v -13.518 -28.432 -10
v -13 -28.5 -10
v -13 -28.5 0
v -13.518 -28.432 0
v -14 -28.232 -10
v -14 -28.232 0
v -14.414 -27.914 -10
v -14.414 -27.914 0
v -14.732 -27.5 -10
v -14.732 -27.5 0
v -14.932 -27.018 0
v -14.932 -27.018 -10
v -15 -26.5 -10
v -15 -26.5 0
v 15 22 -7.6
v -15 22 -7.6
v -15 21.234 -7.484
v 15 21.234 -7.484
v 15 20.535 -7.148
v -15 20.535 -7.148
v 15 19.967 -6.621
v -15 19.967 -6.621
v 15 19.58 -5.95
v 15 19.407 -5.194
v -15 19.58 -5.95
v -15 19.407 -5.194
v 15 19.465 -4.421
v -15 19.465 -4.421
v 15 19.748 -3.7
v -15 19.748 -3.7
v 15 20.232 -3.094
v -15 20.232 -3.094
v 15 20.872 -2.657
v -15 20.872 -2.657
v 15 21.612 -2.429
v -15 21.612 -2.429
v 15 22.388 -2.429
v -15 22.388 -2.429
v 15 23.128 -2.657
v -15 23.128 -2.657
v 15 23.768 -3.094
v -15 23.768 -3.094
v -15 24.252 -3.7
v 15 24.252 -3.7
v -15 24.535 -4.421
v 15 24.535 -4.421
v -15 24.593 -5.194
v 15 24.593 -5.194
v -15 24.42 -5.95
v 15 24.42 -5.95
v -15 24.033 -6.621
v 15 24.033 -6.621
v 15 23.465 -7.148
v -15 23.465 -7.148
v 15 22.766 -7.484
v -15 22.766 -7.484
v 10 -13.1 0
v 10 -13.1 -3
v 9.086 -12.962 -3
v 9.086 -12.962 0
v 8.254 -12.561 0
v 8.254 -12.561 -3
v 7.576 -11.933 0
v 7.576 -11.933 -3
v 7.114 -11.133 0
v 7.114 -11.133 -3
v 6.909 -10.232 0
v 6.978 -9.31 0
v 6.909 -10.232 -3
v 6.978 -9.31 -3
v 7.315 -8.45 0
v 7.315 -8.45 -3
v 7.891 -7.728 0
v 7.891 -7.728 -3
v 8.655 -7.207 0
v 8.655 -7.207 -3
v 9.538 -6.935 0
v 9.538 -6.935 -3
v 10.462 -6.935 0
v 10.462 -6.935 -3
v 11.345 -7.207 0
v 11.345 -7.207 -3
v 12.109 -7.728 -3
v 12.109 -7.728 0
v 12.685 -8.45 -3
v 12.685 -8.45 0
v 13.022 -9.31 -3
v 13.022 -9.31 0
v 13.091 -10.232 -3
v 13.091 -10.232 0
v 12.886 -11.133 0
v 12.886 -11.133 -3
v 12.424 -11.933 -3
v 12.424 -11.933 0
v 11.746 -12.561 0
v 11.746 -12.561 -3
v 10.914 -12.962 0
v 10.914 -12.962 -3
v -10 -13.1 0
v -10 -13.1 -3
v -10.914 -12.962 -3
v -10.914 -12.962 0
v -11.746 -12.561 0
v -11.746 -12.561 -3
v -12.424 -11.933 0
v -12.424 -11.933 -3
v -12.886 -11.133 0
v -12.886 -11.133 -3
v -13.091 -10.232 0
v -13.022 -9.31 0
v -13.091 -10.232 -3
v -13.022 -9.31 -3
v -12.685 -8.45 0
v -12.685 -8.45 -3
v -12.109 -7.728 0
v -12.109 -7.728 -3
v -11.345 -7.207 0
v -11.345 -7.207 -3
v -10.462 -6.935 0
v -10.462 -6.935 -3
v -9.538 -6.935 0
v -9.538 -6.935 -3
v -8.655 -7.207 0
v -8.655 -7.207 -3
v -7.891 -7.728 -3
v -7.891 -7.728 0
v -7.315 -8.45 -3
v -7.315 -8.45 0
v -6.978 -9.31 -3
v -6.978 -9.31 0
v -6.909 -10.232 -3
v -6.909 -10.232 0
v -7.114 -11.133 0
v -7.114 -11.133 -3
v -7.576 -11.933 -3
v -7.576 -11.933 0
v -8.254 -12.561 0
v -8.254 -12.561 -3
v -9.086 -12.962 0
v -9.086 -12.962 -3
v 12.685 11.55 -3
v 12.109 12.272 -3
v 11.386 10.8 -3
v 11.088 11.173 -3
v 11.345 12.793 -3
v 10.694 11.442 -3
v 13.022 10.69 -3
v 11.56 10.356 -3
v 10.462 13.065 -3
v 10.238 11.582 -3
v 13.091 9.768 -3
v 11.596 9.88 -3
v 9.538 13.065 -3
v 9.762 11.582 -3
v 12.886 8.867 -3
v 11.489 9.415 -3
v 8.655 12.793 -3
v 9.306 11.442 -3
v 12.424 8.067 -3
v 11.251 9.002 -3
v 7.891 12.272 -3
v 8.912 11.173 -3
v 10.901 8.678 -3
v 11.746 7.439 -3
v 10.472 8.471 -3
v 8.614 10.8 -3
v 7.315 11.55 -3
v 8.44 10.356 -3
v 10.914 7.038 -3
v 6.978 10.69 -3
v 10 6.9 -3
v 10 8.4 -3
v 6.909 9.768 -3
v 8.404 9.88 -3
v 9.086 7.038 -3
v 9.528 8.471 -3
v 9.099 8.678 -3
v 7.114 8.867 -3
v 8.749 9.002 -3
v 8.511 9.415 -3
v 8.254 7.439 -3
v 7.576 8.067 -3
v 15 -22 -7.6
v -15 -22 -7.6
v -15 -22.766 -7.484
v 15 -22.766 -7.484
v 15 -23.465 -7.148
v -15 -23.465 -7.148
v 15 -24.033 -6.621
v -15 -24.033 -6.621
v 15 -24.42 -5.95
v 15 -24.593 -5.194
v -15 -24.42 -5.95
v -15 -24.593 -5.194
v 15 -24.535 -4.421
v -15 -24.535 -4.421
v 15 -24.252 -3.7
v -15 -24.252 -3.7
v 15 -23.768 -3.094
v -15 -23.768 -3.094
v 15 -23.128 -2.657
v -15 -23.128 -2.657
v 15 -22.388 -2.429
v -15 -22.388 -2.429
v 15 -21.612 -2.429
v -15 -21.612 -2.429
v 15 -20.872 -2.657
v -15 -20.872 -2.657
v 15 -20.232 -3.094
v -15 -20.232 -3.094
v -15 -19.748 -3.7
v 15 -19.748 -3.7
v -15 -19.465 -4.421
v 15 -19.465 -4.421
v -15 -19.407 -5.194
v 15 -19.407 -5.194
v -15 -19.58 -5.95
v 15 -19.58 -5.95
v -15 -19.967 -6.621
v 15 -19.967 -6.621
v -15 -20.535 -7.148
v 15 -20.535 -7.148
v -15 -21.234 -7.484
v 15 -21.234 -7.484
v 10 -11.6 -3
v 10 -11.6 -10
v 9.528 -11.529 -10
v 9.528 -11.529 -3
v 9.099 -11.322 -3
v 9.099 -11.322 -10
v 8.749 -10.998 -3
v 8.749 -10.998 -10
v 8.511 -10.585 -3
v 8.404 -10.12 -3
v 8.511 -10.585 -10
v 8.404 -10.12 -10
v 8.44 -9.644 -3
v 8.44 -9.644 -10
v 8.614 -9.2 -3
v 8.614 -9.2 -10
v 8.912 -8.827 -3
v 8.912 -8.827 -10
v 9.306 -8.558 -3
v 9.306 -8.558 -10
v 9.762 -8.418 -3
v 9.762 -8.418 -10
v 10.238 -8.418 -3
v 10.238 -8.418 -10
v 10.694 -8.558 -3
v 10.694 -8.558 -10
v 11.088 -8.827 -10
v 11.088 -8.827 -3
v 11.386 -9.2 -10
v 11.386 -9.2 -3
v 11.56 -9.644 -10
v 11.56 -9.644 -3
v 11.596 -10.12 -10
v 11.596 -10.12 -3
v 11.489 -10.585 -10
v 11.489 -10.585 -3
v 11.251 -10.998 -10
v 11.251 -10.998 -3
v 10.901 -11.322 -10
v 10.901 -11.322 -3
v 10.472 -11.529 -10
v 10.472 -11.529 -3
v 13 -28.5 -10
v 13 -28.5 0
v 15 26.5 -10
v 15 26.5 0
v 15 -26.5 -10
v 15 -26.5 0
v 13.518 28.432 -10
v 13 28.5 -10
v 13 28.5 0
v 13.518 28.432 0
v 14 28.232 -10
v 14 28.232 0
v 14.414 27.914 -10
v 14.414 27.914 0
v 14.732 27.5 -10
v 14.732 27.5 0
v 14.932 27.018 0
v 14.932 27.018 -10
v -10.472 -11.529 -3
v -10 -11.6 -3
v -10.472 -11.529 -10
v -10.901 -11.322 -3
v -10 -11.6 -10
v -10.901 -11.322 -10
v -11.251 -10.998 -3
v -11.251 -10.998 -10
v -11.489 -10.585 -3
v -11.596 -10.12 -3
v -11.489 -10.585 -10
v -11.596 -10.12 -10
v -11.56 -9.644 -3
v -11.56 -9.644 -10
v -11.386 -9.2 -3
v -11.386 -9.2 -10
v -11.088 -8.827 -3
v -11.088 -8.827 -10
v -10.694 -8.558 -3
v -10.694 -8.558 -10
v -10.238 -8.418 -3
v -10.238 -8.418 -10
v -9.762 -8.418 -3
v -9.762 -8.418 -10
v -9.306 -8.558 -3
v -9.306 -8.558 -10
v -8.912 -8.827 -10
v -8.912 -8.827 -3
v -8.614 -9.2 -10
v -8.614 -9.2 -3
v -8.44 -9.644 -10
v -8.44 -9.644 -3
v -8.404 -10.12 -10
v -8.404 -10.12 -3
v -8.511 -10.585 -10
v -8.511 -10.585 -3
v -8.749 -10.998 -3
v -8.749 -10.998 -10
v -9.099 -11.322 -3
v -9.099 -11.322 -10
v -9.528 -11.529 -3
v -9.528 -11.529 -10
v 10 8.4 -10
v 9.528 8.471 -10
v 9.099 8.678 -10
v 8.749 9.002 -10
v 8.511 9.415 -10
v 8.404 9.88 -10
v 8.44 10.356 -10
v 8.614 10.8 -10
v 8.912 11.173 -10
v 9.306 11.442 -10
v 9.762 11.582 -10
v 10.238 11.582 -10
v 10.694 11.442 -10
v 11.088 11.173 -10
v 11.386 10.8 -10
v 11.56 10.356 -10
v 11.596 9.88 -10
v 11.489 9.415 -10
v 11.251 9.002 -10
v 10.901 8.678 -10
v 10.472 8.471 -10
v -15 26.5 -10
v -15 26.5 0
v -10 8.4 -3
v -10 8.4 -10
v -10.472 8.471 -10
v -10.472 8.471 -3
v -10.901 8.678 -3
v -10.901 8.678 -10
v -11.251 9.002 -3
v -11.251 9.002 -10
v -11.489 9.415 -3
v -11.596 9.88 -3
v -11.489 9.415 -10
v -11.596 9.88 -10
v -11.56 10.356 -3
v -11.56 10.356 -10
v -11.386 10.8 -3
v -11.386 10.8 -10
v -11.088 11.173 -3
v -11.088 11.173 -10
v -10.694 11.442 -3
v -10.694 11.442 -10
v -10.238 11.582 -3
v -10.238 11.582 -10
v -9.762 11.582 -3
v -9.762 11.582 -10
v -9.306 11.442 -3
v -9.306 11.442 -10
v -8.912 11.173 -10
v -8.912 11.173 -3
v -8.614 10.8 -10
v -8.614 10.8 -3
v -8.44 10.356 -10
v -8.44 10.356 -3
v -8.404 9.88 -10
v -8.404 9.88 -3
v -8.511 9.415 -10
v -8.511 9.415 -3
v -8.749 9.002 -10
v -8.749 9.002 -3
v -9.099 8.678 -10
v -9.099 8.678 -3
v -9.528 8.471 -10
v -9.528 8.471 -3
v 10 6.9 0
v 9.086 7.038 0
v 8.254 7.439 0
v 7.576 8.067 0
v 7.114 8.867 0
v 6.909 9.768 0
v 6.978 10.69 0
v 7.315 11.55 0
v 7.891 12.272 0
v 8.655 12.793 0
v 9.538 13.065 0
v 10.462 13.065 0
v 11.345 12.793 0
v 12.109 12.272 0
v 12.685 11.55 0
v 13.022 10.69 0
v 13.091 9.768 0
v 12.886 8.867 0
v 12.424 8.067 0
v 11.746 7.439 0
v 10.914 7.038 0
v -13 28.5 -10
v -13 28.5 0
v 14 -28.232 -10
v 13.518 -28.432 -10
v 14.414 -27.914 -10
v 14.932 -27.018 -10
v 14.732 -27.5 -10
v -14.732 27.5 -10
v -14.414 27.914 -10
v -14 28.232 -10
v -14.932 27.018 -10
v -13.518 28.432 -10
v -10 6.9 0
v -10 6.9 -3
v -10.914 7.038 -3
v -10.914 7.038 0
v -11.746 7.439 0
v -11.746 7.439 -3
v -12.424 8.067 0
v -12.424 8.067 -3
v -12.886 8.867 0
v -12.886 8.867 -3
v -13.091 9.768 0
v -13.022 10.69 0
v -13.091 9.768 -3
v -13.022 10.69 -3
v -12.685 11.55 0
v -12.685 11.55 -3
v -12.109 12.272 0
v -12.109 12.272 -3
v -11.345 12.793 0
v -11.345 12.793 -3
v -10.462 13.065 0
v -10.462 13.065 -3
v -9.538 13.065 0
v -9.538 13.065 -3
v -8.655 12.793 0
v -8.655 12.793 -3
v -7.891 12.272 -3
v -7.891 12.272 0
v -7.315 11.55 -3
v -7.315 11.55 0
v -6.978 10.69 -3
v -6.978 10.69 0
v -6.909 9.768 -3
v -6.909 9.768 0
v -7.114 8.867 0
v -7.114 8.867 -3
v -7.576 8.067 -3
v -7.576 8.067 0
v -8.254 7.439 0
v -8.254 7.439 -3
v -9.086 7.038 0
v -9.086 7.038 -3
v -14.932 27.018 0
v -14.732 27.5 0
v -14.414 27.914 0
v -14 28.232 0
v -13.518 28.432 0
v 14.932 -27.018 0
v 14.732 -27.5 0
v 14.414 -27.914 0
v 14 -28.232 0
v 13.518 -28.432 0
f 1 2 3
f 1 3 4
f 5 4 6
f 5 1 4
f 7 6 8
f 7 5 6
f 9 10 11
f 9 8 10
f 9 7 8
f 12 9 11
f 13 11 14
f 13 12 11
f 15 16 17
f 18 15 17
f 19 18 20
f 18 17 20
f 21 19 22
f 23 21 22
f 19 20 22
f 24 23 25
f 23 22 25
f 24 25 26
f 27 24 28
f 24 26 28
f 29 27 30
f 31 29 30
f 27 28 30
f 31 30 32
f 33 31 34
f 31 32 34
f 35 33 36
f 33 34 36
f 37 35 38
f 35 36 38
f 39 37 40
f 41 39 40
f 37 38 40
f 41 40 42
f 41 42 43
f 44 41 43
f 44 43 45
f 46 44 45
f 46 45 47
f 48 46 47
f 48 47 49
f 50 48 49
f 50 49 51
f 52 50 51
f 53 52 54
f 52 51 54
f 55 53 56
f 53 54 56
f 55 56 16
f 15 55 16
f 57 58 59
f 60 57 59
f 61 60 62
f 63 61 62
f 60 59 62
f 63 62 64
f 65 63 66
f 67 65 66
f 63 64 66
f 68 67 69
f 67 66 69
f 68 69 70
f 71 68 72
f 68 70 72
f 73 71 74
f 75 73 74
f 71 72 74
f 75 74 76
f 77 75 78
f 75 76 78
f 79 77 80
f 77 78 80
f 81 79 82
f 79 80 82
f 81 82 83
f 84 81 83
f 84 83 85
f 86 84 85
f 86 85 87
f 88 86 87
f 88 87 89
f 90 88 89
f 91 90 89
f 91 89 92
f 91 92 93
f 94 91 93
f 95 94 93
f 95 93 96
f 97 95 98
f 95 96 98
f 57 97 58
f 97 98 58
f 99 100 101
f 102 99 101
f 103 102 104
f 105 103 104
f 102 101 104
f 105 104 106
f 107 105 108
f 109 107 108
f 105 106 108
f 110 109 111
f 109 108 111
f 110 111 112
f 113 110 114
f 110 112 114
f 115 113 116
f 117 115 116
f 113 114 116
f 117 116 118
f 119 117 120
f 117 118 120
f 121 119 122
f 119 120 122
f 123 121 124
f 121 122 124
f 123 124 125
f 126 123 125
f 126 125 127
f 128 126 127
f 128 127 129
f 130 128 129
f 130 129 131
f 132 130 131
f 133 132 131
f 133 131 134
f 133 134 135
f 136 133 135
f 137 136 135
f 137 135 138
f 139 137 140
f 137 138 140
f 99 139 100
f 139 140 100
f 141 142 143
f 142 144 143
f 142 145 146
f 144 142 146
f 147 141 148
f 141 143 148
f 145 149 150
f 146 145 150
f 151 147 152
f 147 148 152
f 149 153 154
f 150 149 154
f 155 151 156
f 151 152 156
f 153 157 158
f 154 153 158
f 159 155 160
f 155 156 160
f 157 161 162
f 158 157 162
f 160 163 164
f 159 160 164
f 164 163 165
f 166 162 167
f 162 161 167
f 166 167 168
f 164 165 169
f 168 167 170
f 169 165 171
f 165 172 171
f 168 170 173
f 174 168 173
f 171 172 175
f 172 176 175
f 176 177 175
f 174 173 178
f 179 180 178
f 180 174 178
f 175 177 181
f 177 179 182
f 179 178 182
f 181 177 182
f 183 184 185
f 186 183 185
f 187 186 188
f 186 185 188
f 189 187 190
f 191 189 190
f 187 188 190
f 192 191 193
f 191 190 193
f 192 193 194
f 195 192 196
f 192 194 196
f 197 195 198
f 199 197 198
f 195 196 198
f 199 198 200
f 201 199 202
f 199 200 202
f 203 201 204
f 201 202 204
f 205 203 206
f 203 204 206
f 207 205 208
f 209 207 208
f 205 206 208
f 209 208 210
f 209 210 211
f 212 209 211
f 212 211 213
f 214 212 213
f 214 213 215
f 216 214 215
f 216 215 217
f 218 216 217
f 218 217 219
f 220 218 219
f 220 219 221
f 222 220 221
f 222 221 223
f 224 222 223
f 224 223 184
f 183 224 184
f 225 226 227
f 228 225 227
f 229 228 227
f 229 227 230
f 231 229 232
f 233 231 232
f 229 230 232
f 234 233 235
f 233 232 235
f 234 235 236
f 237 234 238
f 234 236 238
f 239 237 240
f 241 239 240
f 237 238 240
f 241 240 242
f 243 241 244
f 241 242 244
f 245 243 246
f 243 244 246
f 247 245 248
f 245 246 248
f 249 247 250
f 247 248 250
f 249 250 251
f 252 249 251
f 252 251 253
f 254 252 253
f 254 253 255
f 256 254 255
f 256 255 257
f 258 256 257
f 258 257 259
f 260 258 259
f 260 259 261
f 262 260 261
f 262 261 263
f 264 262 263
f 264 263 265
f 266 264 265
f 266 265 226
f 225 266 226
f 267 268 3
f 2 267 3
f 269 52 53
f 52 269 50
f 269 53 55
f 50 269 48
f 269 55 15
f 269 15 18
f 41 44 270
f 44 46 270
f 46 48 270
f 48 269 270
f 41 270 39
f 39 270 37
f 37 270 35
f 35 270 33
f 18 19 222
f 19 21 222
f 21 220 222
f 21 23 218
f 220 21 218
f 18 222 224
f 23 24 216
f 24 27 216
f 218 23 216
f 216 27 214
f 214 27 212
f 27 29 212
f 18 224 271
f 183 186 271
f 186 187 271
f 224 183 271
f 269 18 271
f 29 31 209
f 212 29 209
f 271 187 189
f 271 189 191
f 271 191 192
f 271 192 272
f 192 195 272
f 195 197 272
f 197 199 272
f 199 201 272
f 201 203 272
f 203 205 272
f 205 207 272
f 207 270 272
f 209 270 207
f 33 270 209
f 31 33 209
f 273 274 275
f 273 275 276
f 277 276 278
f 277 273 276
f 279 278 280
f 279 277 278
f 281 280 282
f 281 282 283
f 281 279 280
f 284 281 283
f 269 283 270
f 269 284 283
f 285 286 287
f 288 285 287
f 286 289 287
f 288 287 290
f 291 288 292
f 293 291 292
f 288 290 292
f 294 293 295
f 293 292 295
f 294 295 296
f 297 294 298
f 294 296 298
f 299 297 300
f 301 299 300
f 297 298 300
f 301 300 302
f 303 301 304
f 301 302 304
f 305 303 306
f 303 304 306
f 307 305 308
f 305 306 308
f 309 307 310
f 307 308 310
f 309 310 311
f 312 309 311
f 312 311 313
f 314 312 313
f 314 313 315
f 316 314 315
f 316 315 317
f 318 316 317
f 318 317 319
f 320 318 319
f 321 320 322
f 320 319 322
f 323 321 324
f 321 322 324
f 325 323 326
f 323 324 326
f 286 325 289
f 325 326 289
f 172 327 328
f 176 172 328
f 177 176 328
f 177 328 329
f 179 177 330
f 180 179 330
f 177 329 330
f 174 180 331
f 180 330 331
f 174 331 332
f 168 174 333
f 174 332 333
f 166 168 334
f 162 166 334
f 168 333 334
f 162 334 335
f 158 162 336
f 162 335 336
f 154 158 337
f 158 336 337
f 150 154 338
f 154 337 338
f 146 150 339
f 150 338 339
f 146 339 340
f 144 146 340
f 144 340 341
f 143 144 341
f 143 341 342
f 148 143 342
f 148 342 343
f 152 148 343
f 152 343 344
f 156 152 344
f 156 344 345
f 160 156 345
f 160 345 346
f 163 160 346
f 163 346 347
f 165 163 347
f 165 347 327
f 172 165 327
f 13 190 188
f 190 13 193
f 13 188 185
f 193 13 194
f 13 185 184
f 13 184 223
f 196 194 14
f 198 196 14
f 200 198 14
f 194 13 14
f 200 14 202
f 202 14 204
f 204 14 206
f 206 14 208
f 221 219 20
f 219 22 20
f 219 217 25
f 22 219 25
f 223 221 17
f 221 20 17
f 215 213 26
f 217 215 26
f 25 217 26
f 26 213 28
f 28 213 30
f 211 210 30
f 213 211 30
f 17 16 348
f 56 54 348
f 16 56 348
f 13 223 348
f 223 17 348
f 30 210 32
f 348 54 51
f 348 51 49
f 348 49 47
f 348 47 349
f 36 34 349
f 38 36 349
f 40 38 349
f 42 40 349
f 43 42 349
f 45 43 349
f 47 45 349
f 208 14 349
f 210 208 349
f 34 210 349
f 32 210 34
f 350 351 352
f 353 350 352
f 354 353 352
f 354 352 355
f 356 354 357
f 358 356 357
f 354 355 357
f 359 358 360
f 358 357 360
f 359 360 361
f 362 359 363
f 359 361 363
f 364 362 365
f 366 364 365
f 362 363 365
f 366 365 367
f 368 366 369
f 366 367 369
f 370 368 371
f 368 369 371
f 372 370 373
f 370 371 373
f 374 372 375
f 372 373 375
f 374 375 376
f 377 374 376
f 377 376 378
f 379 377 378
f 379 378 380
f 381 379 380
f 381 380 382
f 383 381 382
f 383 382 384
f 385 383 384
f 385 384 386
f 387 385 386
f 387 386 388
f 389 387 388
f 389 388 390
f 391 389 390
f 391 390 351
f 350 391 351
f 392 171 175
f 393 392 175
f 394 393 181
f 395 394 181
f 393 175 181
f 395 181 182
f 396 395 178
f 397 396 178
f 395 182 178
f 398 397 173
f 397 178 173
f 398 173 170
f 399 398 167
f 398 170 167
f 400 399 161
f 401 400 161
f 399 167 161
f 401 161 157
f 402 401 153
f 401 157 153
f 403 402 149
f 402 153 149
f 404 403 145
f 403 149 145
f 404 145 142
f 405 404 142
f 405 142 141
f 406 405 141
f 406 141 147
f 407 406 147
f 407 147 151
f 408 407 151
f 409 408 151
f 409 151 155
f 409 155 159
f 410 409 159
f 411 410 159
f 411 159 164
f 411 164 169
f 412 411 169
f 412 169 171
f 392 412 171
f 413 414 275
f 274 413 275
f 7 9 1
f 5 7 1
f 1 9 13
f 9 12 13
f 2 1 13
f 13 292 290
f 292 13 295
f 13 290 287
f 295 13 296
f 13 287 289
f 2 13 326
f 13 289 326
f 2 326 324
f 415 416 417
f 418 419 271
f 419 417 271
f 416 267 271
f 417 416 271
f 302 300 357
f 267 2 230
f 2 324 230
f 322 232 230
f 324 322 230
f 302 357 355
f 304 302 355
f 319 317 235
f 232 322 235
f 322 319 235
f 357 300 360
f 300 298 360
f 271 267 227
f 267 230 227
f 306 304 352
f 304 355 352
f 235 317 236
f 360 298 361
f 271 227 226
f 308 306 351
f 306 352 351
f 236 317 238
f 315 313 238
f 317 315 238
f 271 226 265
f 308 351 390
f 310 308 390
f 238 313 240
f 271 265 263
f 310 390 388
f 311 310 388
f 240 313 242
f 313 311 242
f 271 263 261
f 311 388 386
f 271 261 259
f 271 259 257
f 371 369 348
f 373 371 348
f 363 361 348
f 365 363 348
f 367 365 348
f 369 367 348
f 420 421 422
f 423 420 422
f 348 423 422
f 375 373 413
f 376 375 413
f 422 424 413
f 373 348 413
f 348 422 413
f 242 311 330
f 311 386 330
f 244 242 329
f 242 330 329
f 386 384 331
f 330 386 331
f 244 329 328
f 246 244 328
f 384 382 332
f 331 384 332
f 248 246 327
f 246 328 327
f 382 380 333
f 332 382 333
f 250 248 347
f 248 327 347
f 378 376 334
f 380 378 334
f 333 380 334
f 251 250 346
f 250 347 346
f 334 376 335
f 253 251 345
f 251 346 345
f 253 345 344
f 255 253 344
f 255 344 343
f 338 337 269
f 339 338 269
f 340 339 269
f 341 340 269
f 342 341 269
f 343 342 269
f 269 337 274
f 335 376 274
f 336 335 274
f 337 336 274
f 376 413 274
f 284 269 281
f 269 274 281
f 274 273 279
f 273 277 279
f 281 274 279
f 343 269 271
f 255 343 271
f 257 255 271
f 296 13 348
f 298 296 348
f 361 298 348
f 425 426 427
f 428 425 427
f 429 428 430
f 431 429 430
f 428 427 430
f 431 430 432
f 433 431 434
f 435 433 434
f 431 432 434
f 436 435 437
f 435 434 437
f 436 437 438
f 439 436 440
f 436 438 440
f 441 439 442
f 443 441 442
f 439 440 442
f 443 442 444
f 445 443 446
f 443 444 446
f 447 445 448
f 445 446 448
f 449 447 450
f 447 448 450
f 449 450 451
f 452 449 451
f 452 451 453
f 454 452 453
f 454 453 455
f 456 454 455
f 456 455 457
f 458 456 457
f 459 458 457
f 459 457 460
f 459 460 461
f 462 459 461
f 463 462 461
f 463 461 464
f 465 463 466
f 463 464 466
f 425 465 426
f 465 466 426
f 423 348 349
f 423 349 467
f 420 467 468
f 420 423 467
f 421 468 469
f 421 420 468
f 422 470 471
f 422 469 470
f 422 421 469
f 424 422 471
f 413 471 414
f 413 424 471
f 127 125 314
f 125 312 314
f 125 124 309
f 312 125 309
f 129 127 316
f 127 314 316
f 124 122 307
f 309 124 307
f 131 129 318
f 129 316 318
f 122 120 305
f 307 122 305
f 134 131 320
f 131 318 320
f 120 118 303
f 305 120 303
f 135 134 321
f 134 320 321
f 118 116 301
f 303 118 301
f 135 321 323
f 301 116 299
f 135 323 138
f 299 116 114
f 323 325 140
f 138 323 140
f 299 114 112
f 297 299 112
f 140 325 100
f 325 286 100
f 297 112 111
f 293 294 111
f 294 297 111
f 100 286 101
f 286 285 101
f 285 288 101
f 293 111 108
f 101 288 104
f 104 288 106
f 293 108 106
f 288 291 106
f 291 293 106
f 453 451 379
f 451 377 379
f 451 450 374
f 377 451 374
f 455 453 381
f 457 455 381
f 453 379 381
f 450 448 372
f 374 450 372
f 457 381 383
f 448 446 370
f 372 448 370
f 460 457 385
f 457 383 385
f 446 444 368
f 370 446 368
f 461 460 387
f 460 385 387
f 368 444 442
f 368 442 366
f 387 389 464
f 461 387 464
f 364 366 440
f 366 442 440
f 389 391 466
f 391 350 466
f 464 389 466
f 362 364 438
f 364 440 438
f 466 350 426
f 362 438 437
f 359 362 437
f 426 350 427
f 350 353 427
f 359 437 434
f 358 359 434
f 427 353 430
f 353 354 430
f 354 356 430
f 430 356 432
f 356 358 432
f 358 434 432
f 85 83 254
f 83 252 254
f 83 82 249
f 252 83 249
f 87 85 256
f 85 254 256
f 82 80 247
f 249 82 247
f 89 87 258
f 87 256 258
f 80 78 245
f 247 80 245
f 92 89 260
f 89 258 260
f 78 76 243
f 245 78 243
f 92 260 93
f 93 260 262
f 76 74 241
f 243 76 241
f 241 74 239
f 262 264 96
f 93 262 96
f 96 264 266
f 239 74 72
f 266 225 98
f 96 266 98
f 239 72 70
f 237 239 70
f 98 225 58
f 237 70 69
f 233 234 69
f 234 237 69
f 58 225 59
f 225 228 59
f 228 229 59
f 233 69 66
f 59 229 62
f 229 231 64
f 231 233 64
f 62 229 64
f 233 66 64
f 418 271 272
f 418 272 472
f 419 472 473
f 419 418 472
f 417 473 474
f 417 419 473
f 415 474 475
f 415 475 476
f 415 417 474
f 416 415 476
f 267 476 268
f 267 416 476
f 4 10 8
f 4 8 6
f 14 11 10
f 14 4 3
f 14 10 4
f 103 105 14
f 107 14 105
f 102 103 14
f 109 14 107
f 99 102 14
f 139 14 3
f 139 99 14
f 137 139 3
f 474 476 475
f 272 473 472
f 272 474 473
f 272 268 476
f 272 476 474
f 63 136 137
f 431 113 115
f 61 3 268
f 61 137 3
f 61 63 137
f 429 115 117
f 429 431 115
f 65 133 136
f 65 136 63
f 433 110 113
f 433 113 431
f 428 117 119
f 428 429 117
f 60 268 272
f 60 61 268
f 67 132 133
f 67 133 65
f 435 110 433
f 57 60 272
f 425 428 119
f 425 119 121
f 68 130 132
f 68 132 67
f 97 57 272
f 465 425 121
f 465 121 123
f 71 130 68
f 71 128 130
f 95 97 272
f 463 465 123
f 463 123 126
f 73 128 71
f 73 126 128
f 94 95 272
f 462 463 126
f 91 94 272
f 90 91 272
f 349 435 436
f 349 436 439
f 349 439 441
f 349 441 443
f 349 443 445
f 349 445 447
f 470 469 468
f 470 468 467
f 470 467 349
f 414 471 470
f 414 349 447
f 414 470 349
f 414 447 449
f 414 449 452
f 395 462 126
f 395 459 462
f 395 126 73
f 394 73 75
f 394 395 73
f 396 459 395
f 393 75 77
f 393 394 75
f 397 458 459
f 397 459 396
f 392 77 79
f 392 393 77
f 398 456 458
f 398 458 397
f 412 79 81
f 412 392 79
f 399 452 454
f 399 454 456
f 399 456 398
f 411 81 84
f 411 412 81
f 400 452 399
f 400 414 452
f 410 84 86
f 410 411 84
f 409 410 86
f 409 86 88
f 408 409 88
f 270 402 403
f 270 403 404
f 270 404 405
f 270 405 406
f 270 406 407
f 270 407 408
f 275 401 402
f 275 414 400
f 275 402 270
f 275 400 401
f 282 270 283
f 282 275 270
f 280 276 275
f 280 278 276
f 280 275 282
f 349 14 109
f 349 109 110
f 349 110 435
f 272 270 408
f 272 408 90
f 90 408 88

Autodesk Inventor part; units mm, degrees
ref_plane "YZ Plane" through (0, 0, 0) normal (1, 0, 0) x (0, 1, 0)
ref_plane "XZ Plane" through (0, 0, 0) normal (0, 1, 0) x (-1, 0, 0)
ref_plane "XY Plane" through (0, 0, 0) normal (0, 0, 1) x (1, 0, 0)
sketch "Sketch1" plane through (0, 0, 0) normal (0, 0, 1) x (1, 0, 0)
  line L0 (-15, 28.5) -> (15, 28.5)
  line L1 (15, 28.5) -> (15, -28.5)
  line L2 (15, -28.5) -> (-15, -28.5)
  line L3 (-15, -28.5) -> (-15, 28.5)
  line L4 (-10, 10) -> (10, 10) construction
  line L5 (10, 10) -> (10, -10) construction
  line L6 (10, -10) -> (-10, -10) construction
  line L7 (-10, -10) -> (-10, 10) construction
  point P0 (0, 0)
  point P1 (0, 10)
  point P2 (0, 28.5)
  point P3 (10, 0)
  point P4 (15, 0)
  dimension "d0" = 20
  dimension "d1" = 30
  dimension "d2" = 57
extrude "Extrusion1" add sketch "Sketch1" against normal blind 10
hole "Hole1" at (-10, 10, 0) at (10, 10, 0) at (10, -10, 0) at (-10, -10, 0) direction (0, 0, -1) diameter 3.2 end through all counterbore diameter 6.2 counterbore depth 3
sketch "Sketch2" plane through (15, -28.5, 0) normal (1, 0, 0) x (0, 0, -1)
  line L0 (0, 0) -> (0, 57) projected
  line L1 (0, 0) -> (10, 0) projected
  line L2 (10, 57) -> (10, 0) projected
  line L3 (0, 57) -> (10, 57) projected
  point P0 (0, 28.5)
  point P1 (5, 50.5)
  point P2 (5, 6.5)
  point P3 (5, 57)
  dimension "d12" = 6.5
  dimension "d13" = 6.5
  dimension "d14" = 44
hole "Hole2" at (15, 22, -5) at (15, -22, -5) direction (-1, 0, 0) diameter 5.2 end through all
fillet "Fillet1" radius 2 4 edges at (15, 28.5, -5) (-15, 28.5, -5) (-15, -28.5, -5) (15, -28.5, -5)
equation "\"d13\" = d12"
properties part number "Adapter Mount"
